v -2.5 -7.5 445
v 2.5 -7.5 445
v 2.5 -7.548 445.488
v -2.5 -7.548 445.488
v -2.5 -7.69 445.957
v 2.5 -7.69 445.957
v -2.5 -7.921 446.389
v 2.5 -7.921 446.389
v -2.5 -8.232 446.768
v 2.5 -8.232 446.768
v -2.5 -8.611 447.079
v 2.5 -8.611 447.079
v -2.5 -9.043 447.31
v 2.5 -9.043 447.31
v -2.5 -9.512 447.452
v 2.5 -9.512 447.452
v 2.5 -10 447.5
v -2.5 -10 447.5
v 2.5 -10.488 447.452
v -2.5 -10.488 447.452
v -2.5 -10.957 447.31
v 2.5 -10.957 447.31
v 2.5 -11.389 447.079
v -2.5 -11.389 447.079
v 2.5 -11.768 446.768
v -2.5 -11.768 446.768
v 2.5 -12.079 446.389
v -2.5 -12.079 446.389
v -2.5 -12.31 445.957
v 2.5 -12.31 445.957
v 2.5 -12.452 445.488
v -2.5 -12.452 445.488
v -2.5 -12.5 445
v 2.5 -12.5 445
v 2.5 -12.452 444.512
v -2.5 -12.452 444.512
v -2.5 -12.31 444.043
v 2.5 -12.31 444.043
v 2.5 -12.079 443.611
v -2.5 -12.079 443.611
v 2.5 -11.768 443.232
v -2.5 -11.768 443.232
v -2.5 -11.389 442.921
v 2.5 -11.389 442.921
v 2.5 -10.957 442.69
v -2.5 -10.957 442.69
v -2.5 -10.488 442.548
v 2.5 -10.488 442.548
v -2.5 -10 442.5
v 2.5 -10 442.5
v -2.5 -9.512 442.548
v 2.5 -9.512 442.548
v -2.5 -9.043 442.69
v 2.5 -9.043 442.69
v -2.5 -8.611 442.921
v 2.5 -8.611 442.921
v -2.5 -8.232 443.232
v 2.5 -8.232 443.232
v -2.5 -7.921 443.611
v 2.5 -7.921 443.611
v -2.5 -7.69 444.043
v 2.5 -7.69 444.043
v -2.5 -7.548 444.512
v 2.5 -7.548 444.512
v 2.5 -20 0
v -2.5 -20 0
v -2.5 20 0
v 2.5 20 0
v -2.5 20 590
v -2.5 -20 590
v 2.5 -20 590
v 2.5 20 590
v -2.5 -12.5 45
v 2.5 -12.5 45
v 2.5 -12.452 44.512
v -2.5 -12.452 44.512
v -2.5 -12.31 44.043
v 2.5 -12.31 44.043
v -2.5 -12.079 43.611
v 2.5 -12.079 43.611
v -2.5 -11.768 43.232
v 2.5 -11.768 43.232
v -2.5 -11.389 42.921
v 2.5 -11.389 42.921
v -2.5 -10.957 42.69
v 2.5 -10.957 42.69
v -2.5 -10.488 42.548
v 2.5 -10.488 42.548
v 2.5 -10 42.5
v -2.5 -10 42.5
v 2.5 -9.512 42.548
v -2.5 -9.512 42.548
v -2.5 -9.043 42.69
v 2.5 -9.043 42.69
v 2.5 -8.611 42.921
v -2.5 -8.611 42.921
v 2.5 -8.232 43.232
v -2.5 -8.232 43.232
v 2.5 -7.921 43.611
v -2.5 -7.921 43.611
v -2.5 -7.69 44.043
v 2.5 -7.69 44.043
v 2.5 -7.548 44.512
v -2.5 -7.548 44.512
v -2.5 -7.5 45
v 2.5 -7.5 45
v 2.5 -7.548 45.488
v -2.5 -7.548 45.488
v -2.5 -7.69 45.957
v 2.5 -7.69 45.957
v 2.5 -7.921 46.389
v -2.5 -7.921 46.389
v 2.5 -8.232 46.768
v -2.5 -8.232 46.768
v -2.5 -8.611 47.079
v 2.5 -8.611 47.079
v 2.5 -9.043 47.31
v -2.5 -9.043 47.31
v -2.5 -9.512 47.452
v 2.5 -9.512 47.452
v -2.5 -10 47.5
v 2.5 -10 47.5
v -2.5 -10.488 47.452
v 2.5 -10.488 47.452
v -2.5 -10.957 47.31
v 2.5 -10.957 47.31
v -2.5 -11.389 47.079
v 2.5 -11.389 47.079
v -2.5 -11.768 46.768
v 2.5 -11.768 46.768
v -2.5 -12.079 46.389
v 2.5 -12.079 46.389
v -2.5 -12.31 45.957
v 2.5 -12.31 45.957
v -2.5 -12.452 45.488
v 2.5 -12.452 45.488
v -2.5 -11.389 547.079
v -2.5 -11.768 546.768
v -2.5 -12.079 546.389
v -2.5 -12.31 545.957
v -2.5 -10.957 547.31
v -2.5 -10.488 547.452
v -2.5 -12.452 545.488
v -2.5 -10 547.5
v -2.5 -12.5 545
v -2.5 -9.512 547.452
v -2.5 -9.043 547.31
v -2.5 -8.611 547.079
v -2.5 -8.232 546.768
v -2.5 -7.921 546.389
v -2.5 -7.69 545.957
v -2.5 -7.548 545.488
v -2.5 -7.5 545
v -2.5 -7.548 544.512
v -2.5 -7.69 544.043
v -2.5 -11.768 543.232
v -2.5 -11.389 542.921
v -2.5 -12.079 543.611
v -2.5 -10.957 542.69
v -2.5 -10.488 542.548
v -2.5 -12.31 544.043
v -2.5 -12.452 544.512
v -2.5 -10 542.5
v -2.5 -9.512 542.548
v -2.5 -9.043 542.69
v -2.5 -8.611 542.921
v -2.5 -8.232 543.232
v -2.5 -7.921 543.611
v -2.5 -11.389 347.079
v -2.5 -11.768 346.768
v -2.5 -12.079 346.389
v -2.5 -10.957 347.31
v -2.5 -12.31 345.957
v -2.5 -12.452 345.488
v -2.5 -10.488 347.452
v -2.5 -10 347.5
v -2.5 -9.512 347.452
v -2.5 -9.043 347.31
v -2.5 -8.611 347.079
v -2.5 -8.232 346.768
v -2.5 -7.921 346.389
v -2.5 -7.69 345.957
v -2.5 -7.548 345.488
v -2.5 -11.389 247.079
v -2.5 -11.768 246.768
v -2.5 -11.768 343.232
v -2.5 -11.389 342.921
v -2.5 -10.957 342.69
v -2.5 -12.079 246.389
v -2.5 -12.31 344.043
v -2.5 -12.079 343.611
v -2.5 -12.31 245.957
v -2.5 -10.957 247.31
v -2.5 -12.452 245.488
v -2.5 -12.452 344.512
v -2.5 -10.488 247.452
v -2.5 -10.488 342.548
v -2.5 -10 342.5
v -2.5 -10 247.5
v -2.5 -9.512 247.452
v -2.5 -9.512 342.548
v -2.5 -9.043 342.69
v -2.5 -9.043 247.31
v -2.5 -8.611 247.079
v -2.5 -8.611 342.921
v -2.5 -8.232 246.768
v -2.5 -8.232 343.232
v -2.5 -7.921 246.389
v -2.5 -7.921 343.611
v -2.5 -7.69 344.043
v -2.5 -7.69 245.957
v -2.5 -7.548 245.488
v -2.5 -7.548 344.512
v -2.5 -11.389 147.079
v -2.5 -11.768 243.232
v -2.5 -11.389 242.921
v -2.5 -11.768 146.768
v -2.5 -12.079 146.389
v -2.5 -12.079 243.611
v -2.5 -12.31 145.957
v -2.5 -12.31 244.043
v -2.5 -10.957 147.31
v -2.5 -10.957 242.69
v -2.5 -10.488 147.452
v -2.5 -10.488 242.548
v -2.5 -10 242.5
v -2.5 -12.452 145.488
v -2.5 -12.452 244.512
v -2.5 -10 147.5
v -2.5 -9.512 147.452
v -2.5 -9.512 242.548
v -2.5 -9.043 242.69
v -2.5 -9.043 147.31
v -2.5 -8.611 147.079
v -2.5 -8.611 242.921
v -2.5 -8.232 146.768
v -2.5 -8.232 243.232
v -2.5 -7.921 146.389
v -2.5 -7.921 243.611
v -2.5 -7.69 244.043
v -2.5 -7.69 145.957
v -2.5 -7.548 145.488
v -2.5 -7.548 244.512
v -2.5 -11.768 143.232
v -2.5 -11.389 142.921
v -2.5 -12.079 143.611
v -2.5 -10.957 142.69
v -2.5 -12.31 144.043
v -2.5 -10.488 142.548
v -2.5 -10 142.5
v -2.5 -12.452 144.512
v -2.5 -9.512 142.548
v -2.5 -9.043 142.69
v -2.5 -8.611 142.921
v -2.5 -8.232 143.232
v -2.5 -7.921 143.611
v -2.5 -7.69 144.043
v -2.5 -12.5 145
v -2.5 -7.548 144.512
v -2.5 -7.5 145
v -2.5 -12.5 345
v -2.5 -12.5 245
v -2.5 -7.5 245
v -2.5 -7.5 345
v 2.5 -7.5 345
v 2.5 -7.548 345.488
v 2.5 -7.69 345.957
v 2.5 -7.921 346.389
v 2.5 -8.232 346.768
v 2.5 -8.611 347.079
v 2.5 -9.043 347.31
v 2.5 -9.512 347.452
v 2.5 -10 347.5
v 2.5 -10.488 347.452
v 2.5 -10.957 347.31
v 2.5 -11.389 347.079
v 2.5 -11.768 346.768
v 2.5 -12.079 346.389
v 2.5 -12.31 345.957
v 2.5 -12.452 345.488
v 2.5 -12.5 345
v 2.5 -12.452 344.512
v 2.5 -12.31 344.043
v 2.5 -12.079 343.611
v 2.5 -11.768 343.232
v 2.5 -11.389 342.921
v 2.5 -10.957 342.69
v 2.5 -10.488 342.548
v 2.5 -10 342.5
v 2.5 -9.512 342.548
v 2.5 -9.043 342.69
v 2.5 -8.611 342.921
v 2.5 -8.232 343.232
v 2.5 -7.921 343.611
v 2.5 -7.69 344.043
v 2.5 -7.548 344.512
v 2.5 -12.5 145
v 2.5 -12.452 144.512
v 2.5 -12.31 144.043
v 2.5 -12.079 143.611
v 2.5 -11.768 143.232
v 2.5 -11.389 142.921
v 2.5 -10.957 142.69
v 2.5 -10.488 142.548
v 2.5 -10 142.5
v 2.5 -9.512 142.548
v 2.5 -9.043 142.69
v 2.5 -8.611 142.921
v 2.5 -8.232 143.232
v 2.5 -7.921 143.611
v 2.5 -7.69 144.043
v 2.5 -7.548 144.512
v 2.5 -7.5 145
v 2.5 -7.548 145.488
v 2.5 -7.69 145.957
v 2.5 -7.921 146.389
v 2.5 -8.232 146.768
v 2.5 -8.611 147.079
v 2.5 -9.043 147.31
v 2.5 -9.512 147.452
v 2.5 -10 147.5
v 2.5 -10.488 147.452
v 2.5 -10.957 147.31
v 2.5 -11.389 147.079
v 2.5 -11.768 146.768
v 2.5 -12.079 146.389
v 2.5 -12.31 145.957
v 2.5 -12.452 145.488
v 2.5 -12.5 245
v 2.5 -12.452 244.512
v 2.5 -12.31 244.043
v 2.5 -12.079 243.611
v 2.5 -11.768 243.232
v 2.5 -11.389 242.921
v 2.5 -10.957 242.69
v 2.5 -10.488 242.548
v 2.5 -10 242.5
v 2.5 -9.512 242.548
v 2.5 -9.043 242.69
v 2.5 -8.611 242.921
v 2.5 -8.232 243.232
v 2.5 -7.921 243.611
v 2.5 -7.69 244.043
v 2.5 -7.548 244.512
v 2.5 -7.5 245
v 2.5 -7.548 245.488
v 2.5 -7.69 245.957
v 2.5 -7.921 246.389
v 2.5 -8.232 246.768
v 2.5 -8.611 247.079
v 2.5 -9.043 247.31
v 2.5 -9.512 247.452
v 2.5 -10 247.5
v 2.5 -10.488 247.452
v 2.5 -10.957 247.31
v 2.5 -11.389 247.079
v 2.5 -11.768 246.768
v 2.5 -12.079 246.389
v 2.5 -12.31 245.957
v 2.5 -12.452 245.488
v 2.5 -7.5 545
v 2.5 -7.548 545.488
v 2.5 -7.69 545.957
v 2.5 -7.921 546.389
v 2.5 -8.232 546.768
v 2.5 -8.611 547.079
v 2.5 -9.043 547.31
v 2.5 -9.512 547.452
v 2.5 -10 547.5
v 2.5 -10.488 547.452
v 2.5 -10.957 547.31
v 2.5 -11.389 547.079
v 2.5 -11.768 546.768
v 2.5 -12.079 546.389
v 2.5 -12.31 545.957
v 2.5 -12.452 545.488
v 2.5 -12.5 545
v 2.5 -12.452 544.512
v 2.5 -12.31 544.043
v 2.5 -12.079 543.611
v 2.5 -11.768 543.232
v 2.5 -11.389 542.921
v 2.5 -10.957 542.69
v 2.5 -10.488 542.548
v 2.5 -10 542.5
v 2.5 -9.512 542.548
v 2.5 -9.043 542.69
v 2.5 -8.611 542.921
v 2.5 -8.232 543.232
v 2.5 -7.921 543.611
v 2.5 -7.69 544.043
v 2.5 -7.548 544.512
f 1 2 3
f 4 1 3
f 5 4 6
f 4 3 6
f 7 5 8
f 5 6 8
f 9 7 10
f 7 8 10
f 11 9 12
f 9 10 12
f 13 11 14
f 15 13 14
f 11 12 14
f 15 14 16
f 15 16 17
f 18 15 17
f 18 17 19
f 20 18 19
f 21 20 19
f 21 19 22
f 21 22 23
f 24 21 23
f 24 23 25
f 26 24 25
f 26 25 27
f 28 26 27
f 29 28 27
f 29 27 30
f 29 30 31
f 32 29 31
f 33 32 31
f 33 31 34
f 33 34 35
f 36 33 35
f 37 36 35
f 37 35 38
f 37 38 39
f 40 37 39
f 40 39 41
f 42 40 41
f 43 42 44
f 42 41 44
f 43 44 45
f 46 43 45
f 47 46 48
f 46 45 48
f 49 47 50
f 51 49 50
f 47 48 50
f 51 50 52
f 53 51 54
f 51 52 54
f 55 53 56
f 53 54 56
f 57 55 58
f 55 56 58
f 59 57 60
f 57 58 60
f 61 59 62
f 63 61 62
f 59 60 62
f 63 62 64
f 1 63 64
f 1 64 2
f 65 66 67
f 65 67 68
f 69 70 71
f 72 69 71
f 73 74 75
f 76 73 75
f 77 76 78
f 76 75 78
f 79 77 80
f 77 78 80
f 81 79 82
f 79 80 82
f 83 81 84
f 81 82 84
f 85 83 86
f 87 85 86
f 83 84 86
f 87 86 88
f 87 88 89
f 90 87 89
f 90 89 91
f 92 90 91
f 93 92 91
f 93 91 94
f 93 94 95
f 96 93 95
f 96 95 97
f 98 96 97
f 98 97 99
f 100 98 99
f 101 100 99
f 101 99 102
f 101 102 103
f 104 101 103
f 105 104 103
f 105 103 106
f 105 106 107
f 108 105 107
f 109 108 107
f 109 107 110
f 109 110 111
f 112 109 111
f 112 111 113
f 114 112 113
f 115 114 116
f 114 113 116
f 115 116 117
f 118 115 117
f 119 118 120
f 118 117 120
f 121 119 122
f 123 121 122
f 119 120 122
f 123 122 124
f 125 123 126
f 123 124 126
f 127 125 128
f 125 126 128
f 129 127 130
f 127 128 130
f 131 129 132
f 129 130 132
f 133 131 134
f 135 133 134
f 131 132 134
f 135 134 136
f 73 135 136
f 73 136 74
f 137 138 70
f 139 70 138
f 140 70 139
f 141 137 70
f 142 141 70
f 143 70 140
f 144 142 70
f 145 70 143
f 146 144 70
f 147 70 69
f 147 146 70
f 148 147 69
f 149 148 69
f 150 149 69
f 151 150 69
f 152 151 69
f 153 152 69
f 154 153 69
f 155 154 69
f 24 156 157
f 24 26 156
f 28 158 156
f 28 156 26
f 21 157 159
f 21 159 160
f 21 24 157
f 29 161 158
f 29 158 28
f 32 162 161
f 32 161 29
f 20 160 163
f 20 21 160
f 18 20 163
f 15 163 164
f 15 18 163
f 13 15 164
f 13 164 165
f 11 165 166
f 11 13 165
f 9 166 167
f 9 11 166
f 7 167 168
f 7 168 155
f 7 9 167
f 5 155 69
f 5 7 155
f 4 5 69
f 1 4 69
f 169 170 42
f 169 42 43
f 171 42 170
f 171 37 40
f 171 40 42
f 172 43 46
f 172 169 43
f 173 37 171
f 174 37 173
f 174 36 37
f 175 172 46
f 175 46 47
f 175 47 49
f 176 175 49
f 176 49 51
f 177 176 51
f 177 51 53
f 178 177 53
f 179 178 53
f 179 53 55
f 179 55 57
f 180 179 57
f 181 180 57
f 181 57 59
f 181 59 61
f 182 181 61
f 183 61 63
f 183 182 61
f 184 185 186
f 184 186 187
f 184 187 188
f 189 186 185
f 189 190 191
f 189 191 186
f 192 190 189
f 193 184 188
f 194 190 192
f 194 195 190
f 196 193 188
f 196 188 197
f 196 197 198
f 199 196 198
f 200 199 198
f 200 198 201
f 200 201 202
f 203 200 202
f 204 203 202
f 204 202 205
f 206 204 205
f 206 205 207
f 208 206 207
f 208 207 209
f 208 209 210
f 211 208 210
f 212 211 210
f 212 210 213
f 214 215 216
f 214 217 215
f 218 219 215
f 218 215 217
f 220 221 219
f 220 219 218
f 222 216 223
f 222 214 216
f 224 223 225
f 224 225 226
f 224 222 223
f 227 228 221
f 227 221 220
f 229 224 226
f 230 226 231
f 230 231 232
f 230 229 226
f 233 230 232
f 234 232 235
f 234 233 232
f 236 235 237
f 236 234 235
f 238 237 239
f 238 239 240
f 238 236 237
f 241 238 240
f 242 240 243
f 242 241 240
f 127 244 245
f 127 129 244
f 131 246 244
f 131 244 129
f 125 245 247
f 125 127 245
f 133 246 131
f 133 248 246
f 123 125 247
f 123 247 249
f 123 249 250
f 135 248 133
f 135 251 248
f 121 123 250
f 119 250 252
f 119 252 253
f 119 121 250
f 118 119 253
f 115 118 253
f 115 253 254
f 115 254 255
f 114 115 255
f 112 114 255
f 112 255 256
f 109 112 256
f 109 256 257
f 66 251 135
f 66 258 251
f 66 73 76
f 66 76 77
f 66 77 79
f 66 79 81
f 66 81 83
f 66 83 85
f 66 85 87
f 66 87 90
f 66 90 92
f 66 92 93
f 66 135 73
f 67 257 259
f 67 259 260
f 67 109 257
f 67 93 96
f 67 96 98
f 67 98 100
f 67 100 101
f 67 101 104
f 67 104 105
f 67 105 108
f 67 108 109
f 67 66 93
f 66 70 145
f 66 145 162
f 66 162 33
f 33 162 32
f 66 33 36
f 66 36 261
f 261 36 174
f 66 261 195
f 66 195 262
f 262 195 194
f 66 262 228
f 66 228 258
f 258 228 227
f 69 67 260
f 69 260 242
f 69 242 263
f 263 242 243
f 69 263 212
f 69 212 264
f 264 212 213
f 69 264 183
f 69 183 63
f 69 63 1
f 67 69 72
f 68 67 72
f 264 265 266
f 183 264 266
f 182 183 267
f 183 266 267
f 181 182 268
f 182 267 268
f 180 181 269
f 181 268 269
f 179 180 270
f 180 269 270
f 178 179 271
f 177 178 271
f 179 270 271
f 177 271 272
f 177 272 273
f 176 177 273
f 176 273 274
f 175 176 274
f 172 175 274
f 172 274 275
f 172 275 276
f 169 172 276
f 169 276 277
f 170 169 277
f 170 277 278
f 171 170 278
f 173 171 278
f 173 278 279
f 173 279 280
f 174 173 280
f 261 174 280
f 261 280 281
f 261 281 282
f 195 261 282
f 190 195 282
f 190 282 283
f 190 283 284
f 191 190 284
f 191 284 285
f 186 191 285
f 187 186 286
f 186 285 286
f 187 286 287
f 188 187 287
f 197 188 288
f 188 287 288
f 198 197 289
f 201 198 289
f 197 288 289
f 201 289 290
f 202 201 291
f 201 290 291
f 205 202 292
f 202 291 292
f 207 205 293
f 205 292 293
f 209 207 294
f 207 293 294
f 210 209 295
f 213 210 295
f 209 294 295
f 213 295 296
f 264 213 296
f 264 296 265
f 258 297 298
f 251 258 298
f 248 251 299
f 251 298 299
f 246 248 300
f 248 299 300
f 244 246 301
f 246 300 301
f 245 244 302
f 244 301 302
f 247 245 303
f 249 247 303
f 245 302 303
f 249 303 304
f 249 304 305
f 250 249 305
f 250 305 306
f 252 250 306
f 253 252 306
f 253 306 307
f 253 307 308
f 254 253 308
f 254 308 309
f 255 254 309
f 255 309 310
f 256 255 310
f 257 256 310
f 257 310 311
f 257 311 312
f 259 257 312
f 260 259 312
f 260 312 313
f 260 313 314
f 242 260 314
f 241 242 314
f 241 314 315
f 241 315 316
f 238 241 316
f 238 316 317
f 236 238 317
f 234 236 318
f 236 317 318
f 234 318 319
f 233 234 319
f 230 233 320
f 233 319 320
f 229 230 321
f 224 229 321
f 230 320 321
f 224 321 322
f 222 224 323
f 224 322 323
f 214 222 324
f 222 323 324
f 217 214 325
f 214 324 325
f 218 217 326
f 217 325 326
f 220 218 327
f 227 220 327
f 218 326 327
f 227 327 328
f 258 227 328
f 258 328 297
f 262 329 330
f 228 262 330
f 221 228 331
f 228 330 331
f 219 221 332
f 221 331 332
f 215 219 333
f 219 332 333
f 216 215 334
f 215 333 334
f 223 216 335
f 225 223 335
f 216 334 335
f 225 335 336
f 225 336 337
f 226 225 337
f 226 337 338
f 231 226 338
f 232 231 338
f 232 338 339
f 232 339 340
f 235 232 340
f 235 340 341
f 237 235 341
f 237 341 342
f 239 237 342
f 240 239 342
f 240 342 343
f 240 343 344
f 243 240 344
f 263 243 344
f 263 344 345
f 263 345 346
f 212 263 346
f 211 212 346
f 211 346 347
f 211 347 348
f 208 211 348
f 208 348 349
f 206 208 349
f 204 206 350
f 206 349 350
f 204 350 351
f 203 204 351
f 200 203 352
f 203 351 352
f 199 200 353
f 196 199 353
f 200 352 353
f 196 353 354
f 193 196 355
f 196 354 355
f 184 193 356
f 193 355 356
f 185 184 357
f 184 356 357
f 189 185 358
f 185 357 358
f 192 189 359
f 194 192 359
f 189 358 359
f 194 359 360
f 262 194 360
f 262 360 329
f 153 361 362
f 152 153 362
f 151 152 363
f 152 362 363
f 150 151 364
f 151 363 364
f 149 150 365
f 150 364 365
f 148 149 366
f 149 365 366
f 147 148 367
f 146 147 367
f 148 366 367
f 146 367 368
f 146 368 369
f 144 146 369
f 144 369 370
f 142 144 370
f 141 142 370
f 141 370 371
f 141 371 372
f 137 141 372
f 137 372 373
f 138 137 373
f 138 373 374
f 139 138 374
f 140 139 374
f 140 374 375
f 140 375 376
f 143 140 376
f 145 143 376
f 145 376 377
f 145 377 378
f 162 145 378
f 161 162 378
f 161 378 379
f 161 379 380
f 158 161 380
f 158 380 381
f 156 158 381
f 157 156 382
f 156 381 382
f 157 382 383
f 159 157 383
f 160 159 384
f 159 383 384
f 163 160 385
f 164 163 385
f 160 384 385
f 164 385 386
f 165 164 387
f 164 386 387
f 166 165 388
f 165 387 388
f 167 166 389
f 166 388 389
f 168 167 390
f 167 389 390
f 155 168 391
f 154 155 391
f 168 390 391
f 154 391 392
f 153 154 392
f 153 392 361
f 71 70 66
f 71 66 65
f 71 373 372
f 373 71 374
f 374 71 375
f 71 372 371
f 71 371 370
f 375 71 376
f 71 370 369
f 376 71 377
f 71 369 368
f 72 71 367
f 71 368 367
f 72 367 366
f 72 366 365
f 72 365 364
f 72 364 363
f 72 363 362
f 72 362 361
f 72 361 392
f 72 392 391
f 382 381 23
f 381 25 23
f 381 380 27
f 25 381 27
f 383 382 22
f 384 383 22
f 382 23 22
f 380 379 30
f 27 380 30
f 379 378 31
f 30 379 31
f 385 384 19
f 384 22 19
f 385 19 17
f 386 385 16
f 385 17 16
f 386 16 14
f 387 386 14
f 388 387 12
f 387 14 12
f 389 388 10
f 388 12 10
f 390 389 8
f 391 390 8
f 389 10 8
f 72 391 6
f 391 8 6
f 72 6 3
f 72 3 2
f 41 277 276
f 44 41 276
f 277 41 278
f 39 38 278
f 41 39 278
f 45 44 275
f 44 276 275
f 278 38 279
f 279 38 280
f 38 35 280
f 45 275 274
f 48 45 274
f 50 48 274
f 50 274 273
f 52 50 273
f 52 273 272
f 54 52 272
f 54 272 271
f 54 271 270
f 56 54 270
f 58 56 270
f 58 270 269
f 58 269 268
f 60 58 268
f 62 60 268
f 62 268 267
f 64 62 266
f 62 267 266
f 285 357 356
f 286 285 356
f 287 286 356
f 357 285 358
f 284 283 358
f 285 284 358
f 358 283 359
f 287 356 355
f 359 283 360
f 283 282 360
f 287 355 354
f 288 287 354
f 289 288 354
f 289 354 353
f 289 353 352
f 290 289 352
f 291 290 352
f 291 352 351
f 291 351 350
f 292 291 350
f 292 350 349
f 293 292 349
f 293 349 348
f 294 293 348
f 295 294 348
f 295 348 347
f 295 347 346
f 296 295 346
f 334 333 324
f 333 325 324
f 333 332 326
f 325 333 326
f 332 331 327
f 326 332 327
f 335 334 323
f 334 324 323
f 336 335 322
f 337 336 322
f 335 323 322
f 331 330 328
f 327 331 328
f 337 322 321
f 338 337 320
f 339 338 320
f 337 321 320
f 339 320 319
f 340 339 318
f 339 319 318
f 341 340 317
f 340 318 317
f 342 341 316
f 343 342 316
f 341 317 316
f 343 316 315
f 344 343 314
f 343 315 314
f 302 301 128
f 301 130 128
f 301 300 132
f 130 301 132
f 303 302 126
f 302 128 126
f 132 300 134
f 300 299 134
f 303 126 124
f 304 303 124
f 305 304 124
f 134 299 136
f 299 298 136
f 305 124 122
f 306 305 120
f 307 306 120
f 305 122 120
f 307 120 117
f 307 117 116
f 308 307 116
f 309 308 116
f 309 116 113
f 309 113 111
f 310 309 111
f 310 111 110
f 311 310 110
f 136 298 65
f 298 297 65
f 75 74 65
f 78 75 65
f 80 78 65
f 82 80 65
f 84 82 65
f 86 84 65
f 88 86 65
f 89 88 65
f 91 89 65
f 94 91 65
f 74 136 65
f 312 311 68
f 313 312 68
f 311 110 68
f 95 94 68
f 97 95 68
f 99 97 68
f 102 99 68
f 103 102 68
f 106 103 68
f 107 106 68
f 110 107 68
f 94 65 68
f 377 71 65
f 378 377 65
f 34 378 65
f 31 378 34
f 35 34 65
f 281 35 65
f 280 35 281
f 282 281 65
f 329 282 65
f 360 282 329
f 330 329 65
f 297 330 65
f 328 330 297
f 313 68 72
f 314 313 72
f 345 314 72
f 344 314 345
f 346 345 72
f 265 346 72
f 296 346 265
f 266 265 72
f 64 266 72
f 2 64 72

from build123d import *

# Parameters (mm, degrees)
SKETCH_1_W          = 5
SKETCH_1_H          = 40
EXTRUDE_1_DEPTH     = 590
SKETCH_2_R          = 2.5
CUT_EXTRUDE_1_DEPTH = 591.360059625


with BuildPart() as part:
    # 草图1 → 凸台-拉伸1 (new body)
    with BuildSketch(Plane.XY):
        Rectangle(SKETCH_1_W, SKETCH_1_H)
    extrude(amount=EXTRUDE_1_DEPTH)

    # 草图2 → 切除-拉伸1 (cut, through all)
    with BuildSketch(Plane(origin=(2.5, 0, 0), x_dir=(0, 0, -1), z_dir=(1, 0, 0))):
        with Locations(Location((-345, -10, 0), (0, 0, 90))):
            Circle(SKETCH_2_R)
        with Locations(Location((-445, -10, 0), (0, 0, 90))):
            Circle(SKETCH_2_R)
        with Locations(Location((-145, -10, 0), (0, 0, 270))):
            Circle(SKETCH_2_R)
        with Locations(Location((-245, -10, 0), (0, 0, 270))):
            Circle(SKETCH_2_R)
        with Locations(Location((-545, -10, 0), (0, 0, 90))):
            Circle(SKETCH_2_R)
        with Locations(Location((-45, -10, 0), (0, 0, 270))):
            Circle(SKETCH_2_R)
    extrude(amount=-CUT_EXTRUDE_1_DEPTH, mode=Mode.SUBTRACT)


solid = part.part
